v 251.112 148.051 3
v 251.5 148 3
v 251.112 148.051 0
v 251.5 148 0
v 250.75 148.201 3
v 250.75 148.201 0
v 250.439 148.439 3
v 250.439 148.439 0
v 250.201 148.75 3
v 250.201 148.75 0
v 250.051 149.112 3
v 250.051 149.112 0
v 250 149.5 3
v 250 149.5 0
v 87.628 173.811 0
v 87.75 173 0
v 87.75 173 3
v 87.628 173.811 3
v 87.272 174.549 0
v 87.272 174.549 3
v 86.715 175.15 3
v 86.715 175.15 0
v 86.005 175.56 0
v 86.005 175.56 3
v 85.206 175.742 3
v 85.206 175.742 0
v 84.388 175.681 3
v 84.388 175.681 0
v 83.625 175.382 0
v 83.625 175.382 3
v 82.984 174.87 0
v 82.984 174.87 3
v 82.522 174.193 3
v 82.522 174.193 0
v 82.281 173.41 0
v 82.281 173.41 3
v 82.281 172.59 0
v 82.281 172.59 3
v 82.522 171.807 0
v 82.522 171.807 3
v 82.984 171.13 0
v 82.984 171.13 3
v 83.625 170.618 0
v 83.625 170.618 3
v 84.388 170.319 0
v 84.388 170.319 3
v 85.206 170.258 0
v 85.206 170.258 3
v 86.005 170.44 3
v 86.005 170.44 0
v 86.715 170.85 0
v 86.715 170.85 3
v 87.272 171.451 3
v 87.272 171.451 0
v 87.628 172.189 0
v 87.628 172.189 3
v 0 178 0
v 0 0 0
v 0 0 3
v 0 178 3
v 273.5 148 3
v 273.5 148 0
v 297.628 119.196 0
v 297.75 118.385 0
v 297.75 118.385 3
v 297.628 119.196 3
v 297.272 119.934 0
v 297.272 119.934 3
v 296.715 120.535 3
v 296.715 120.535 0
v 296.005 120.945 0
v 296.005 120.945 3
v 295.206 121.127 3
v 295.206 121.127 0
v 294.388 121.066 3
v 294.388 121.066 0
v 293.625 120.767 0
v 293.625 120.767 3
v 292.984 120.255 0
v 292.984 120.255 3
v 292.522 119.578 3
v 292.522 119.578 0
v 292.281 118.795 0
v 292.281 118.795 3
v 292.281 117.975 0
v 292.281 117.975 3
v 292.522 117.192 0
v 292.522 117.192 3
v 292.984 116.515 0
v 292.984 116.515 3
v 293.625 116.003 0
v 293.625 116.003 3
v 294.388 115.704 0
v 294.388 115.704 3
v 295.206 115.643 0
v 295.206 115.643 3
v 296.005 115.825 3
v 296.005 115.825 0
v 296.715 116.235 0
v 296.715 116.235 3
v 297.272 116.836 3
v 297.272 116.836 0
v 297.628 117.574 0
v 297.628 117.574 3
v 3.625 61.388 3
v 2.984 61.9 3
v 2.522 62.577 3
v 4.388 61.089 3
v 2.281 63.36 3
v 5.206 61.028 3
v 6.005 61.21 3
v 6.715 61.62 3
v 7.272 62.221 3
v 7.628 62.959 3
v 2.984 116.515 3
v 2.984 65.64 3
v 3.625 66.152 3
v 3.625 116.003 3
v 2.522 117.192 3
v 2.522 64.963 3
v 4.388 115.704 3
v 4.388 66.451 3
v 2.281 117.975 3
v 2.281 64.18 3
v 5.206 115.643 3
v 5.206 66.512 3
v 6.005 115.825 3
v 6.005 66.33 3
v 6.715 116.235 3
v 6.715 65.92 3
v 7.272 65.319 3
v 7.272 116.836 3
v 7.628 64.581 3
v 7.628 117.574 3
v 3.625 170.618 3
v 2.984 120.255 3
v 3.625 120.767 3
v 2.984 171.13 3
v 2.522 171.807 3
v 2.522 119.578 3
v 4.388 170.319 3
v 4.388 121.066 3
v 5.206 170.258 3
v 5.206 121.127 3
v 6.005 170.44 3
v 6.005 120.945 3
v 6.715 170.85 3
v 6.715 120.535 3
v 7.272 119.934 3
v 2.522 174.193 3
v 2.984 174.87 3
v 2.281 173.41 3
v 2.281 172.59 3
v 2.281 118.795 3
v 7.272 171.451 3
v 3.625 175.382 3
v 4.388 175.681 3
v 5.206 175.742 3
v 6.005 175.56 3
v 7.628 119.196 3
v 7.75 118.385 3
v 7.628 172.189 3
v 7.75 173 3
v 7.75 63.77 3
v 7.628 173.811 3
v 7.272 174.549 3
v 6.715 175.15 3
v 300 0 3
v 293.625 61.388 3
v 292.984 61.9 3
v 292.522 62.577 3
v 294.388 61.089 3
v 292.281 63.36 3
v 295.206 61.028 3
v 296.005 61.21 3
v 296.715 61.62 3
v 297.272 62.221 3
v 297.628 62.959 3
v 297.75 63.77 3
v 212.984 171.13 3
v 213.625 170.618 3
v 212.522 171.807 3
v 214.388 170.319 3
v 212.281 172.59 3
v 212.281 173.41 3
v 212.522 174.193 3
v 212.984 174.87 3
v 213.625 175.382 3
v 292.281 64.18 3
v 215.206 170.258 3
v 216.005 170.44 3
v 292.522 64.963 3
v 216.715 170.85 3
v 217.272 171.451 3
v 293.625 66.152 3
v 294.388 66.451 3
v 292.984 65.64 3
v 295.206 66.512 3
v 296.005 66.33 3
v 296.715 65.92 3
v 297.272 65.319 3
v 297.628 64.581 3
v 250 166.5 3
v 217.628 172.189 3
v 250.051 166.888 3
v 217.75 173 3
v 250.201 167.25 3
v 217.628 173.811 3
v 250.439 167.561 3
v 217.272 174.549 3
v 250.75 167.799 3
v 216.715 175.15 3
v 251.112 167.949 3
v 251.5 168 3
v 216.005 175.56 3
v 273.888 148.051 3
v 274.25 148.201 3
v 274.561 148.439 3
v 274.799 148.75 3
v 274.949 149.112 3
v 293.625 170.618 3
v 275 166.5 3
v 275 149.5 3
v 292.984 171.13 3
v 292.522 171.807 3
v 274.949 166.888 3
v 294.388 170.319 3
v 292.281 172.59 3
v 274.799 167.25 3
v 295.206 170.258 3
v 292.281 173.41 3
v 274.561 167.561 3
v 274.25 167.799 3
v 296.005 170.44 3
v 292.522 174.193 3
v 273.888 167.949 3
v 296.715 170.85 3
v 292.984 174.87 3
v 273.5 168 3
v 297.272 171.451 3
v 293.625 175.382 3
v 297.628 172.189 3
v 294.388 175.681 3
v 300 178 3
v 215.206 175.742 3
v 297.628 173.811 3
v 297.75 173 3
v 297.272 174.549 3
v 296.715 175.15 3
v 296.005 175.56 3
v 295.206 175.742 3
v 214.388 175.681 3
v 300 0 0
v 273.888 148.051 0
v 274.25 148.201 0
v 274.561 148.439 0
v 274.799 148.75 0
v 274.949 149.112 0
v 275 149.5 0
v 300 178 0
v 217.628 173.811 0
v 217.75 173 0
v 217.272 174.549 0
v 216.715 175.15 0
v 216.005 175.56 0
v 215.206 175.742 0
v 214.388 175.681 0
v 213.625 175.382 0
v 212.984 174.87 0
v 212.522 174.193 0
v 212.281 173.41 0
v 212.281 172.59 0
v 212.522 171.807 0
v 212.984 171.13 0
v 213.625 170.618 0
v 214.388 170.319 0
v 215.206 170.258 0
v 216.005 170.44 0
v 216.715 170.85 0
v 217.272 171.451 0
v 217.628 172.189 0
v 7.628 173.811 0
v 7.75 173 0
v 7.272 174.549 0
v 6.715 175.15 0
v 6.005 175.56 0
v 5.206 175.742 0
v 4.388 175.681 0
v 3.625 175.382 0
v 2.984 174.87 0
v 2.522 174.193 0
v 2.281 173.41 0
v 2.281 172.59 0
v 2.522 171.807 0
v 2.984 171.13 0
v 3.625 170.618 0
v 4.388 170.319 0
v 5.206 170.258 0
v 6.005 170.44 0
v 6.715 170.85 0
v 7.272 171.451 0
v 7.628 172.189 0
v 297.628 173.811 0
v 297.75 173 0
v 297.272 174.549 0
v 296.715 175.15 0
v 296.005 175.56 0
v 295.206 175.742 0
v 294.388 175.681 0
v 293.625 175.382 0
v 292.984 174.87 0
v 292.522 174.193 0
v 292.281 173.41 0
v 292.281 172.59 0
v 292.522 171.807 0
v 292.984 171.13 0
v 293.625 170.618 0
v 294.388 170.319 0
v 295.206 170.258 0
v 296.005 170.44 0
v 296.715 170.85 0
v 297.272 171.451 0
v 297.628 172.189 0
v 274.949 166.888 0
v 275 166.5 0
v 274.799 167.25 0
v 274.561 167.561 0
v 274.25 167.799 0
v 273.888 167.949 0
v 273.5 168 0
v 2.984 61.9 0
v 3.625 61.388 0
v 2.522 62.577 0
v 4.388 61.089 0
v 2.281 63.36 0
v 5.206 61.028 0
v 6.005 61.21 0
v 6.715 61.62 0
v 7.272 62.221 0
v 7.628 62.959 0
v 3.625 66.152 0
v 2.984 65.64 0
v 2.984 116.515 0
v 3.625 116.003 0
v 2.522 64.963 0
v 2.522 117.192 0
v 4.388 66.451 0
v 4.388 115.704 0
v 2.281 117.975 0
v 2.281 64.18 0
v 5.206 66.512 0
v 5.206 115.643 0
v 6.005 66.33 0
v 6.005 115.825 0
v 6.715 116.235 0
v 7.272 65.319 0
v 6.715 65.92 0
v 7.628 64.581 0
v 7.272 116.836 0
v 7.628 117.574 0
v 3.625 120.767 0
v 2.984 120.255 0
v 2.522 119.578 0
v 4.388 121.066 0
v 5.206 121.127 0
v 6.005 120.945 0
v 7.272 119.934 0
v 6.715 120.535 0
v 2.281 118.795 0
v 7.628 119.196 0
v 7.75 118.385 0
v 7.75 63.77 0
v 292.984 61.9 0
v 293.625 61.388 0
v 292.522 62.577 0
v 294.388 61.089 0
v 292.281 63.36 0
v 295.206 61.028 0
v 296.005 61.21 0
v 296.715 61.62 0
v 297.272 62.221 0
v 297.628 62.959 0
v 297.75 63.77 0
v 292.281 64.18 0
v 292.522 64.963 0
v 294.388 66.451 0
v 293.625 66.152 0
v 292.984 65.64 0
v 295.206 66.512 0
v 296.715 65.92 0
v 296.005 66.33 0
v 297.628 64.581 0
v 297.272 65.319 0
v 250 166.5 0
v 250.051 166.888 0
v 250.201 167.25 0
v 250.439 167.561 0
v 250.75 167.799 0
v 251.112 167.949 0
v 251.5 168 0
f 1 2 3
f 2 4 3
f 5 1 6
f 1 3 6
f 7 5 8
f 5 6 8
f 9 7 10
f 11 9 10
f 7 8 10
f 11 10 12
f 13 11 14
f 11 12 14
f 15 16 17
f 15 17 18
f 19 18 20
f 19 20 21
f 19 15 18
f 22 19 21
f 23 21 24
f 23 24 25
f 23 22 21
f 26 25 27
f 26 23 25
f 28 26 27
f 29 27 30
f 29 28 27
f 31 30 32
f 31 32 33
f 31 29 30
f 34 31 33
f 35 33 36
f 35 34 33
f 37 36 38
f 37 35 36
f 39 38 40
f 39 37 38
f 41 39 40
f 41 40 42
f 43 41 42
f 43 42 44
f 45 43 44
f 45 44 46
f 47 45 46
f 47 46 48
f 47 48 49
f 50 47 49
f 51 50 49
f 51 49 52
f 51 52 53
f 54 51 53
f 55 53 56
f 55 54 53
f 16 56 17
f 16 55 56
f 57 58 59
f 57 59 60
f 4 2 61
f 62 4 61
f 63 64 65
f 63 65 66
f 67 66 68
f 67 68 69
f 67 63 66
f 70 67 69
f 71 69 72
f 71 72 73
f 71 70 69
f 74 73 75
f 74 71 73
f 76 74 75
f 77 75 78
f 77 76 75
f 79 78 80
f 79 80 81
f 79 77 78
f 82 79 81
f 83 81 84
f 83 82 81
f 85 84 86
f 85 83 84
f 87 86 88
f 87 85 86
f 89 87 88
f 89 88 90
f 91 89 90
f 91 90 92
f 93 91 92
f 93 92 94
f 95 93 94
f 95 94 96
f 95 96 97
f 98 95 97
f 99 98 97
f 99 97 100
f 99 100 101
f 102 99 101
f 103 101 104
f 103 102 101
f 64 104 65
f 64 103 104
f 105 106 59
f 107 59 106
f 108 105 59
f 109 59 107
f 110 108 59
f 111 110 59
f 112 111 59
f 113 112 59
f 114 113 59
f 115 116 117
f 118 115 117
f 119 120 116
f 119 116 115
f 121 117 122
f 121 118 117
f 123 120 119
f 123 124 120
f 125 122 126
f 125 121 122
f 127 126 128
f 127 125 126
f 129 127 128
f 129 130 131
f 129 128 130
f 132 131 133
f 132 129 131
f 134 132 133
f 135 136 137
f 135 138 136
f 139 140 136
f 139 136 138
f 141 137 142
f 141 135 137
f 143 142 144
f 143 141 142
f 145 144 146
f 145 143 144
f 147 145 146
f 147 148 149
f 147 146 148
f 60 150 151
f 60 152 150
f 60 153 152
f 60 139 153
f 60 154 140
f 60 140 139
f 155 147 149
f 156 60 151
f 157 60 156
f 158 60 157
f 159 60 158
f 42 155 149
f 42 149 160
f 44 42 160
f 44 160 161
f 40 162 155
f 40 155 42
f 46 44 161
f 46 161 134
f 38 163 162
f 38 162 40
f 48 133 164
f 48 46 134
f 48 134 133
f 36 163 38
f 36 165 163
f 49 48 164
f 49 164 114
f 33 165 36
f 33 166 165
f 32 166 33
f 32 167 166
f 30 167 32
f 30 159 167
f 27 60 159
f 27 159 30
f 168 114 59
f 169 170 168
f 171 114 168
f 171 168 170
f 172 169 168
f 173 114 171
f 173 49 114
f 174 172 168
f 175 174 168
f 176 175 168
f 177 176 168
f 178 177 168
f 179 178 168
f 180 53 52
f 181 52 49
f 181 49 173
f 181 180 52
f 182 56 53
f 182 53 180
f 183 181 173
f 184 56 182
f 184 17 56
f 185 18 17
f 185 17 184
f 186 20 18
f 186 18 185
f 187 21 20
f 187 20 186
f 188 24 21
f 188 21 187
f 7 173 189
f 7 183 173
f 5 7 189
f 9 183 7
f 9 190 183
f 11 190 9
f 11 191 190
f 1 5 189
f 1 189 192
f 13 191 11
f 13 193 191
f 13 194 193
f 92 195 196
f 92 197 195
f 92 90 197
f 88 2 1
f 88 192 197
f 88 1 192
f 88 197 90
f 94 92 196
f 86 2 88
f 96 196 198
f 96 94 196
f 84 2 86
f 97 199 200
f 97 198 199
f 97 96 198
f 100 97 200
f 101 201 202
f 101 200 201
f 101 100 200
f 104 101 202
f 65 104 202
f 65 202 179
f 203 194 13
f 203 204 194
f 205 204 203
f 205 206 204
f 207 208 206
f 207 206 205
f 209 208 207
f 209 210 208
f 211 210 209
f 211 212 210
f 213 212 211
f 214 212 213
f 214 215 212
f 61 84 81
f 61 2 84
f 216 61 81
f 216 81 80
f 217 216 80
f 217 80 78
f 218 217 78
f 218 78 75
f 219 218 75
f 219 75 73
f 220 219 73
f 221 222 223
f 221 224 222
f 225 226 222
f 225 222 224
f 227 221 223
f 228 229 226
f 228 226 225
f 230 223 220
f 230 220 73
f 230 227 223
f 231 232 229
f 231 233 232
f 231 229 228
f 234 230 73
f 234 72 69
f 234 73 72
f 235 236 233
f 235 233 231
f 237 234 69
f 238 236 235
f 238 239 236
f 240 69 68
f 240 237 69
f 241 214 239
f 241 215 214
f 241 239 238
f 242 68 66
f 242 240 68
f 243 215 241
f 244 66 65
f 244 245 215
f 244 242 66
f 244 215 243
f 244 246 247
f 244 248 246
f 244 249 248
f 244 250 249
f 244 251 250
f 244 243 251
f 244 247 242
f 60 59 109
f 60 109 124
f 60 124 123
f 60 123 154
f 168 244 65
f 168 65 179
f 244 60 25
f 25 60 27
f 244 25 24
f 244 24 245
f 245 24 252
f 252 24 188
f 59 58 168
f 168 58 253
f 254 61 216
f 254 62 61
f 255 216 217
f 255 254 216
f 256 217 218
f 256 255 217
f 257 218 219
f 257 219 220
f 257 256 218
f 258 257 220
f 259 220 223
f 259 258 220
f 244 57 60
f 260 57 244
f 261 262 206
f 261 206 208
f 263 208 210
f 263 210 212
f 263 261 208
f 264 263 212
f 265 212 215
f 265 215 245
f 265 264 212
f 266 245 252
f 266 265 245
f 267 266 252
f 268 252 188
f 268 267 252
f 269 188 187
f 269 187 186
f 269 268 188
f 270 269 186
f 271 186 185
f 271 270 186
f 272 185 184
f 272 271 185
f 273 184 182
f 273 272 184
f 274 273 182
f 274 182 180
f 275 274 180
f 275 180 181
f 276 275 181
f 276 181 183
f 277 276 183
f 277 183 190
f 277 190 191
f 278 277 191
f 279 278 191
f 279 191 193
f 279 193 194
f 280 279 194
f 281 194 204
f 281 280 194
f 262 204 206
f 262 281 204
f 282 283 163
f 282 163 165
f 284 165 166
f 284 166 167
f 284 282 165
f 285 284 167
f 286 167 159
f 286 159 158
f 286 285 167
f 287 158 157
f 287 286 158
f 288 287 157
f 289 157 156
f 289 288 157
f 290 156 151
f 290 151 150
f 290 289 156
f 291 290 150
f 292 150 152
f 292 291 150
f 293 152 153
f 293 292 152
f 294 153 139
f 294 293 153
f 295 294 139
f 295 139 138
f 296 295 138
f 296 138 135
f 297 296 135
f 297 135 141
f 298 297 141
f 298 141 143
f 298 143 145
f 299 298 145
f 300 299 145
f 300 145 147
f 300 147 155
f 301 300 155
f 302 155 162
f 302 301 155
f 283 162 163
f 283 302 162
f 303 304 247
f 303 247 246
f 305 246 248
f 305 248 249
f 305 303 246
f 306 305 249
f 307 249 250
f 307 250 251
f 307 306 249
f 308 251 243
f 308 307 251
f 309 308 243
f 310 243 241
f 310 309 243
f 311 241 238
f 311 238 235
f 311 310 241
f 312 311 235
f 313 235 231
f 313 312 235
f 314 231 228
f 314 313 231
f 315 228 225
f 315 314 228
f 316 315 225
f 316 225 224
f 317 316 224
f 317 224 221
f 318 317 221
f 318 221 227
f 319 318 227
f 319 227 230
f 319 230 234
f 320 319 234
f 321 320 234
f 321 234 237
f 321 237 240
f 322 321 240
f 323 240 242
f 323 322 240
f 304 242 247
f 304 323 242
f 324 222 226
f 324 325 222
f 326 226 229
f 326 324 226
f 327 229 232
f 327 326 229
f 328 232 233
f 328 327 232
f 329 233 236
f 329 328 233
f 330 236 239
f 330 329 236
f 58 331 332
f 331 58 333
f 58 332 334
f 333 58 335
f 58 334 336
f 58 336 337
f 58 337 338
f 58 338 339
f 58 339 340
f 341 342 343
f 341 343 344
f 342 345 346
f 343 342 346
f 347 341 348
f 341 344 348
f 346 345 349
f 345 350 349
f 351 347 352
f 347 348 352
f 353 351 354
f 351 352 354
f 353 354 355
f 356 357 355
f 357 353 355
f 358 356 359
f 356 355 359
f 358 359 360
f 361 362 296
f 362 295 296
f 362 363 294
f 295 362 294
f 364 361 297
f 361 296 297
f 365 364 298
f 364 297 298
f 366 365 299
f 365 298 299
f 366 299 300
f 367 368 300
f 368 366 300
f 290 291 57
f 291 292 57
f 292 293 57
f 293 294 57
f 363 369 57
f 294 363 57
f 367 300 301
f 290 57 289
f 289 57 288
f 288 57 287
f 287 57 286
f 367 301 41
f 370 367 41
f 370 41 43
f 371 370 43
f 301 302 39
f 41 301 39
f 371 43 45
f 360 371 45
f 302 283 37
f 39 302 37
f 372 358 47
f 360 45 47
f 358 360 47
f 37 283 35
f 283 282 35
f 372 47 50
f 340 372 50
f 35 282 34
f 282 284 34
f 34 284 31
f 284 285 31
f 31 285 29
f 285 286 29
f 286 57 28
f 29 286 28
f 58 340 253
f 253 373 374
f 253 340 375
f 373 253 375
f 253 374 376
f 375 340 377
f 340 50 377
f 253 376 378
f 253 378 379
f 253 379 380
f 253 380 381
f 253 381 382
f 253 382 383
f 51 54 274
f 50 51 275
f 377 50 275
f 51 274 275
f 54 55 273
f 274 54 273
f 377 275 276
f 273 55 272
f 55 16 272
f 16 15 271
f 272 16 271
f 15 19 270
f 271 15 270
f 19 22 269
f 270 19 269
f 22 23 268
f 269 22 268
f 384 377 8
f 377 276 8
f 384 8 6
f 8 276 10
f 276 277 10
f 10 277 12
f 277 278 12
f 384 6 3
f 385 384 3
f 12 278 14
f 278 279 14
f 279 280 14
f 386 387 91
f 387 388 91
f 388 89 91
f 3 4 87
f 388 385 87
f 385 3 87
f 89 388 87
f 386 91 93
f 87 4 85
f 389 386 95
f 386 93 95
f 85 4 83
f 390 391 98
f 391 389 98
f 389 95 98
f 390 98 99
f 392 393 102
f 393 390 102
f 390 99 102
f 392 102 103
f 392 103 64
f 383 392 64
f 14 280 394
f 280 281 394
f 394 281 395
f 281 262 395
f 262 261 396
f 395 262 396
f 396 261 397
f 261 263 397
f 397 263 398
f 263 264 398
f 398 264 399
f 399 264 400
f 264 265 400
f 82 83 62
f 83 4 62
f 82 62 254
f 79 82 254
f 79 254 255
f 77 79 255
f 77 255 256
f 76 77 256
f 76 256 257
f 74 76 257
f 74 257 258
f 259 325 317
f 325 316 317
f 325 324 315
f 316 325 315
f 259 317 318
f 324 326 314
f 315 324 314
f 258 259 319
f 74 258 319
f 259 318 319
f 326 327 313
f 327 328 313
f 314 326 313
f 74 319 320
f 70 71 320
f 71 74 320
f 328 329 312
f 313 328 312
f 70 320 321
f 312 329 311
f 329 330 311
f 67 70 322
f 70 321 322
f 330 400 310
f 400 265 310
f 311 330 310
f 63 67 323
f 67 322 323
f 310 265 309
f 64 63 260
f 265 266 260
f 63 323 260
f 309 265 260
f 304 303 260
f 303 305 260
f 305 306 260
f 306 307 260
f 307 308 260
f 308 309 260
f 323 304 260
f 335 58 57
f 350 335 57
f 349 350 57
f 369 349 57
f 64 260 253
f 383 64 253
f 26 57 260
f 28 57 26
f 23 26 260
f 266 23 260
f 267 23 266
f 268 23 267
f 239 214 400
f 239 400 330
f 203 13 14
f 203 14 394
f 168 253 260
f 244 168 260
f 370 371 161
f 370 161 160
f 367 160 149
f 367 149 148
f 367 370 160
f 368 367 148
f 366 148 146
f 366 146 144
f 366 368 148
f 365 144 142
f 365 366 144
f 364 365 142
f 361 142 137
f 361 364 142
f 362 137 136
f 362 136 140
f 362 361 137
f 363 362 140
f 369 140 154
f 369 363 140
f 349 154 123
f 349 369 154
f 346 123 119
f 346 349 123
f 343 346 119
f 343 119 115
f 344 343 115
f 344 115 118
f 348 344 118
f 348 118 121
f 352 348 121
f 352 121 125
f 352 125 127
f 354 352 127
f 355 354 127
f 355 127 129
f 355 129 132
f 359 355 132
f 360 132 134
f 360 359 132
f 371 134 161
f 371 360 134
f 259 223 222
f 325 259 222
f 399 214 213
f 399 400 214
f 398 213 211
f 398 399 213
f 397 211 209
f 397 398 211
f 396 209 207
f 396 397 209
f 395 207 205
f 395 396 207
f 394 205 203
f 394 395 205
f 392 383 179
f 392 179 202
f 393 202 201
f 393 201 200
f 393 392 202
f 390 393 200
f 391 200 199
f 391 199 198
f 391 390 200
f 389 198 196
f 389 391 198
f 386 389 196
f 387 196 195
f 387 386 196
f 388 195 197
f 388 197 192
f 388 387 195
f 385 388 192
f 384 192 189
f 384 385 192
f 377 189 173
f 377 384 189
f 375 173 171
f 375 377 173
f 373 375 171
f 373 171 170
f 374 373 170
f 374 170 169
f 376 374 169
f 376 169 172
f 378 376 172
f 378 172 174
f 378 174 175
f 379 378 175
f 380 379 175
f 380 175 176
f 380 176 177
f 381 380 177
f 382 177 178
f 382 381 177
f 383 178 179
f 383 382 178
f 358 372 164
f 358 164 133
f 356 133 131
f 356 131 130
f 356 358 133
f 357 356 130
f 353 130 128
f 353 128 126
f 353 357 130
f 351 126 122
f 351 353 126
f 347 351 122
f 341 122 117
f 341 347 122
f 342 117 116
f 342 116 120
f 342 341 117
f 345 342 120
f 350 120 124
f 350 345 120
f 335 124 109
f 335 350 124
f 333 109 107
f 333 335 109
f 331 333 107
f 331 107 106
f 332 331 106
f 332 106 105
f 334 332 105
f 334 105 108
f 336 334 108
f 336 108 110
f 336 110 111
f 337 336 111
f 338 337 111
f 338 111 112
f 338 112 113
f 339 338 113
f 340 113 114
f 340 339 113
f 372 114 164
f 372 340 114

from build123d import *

# Parameters (mm, degrees)
SKETCH1_W                    = 300
SKETCH1_H                    = 178
BOSS_EXTRUDE1_DEPTH          = 3
M5_CLEARANCE_HOLE1_OUTLINE_R = 2.75
M5_CLEARANCE_HOLE1_DEPTH     = 3
SKETCH4_W                    = 25
SKETCH4_H                    = 20
CUT_EXTRUDE1_DEPTH           = 10
FILLET1_R                    = 1.5


# Read off the part's stored shape, not the designer's step: M5 Clearance Hole1
with BuildPart() as part:
    # Sketch1 → Boss-Extrude1 (new body)
    with BuildSketch(Plane.XY):
        with Locations((150, 89)):
            Rectangle(SKETCH1_W, SKETCH1_H)
    extrude(amount=BOSS_EXTRUDE1_DEPTH)

    # M5 Clearance Hole1 outline → M5 Clearance Hole1 (cut)
    with BuildSketch(Plane.XY):
        with Locations((295, 118.385)):
            Circle(M5_CLEARANCE_HOLE1_OUTLINE_R)
        with Locations((5, 118.385)):
            Circle(M5_CLEARANCE_HOLE1_OUTLINE_R)
        with Locations((295, 173)):
            Circle(M5_CLEARANCE_HOLE1_OUTLINE_R)
        with Locations((295, 63.77)):
            Circle(M5_CLEARANCE_HOLE1_OUTLINE_R)
        with Locations((5, 63.77)):
            Circle(M5_CLEARANCE_HOLE1_OUTLINE_R)
        with Locations((5, 173)):
            Circle(M5_CLEARANCE_HOLE1_OUTLINE_R)
        with Locations((85, 173)):
            Circle(M5_CLEARANCE_HOLE1_OUTLINE_R)
        with Locations((215, 173)):
            Circle(M5_CLEARANCE_HOLE1_OUTLINE_R)
    extrude(amount=M5_CLEARANCE_HOLE1_DEPTH, mode=Mode.SUBTRACT)

    # Sketch4 → Cut-Extrude1 (cut)
    with BuildSketch(Plane.XY.offset(3)):
        with Locations((262.5, 158)):
            Rectangle(SKETCH4_W, SKETCH4_H)
    extrude(amount=-CUT_EXTRUDE1_DEPTH, mode=Mode.SUBTRACT)

    # Fillet1
    fillet1_edges = [part.edges().sort_by_distance(p)[0] for p in [
        (250, 148, 1.5),
        (250, 168, 1.5),
        (275, 168, 1.5),
        (275, 148, 1.5),
    ]]
    fillet(fillet1_edges, radius=FILLET1_R)


solid = part.part
